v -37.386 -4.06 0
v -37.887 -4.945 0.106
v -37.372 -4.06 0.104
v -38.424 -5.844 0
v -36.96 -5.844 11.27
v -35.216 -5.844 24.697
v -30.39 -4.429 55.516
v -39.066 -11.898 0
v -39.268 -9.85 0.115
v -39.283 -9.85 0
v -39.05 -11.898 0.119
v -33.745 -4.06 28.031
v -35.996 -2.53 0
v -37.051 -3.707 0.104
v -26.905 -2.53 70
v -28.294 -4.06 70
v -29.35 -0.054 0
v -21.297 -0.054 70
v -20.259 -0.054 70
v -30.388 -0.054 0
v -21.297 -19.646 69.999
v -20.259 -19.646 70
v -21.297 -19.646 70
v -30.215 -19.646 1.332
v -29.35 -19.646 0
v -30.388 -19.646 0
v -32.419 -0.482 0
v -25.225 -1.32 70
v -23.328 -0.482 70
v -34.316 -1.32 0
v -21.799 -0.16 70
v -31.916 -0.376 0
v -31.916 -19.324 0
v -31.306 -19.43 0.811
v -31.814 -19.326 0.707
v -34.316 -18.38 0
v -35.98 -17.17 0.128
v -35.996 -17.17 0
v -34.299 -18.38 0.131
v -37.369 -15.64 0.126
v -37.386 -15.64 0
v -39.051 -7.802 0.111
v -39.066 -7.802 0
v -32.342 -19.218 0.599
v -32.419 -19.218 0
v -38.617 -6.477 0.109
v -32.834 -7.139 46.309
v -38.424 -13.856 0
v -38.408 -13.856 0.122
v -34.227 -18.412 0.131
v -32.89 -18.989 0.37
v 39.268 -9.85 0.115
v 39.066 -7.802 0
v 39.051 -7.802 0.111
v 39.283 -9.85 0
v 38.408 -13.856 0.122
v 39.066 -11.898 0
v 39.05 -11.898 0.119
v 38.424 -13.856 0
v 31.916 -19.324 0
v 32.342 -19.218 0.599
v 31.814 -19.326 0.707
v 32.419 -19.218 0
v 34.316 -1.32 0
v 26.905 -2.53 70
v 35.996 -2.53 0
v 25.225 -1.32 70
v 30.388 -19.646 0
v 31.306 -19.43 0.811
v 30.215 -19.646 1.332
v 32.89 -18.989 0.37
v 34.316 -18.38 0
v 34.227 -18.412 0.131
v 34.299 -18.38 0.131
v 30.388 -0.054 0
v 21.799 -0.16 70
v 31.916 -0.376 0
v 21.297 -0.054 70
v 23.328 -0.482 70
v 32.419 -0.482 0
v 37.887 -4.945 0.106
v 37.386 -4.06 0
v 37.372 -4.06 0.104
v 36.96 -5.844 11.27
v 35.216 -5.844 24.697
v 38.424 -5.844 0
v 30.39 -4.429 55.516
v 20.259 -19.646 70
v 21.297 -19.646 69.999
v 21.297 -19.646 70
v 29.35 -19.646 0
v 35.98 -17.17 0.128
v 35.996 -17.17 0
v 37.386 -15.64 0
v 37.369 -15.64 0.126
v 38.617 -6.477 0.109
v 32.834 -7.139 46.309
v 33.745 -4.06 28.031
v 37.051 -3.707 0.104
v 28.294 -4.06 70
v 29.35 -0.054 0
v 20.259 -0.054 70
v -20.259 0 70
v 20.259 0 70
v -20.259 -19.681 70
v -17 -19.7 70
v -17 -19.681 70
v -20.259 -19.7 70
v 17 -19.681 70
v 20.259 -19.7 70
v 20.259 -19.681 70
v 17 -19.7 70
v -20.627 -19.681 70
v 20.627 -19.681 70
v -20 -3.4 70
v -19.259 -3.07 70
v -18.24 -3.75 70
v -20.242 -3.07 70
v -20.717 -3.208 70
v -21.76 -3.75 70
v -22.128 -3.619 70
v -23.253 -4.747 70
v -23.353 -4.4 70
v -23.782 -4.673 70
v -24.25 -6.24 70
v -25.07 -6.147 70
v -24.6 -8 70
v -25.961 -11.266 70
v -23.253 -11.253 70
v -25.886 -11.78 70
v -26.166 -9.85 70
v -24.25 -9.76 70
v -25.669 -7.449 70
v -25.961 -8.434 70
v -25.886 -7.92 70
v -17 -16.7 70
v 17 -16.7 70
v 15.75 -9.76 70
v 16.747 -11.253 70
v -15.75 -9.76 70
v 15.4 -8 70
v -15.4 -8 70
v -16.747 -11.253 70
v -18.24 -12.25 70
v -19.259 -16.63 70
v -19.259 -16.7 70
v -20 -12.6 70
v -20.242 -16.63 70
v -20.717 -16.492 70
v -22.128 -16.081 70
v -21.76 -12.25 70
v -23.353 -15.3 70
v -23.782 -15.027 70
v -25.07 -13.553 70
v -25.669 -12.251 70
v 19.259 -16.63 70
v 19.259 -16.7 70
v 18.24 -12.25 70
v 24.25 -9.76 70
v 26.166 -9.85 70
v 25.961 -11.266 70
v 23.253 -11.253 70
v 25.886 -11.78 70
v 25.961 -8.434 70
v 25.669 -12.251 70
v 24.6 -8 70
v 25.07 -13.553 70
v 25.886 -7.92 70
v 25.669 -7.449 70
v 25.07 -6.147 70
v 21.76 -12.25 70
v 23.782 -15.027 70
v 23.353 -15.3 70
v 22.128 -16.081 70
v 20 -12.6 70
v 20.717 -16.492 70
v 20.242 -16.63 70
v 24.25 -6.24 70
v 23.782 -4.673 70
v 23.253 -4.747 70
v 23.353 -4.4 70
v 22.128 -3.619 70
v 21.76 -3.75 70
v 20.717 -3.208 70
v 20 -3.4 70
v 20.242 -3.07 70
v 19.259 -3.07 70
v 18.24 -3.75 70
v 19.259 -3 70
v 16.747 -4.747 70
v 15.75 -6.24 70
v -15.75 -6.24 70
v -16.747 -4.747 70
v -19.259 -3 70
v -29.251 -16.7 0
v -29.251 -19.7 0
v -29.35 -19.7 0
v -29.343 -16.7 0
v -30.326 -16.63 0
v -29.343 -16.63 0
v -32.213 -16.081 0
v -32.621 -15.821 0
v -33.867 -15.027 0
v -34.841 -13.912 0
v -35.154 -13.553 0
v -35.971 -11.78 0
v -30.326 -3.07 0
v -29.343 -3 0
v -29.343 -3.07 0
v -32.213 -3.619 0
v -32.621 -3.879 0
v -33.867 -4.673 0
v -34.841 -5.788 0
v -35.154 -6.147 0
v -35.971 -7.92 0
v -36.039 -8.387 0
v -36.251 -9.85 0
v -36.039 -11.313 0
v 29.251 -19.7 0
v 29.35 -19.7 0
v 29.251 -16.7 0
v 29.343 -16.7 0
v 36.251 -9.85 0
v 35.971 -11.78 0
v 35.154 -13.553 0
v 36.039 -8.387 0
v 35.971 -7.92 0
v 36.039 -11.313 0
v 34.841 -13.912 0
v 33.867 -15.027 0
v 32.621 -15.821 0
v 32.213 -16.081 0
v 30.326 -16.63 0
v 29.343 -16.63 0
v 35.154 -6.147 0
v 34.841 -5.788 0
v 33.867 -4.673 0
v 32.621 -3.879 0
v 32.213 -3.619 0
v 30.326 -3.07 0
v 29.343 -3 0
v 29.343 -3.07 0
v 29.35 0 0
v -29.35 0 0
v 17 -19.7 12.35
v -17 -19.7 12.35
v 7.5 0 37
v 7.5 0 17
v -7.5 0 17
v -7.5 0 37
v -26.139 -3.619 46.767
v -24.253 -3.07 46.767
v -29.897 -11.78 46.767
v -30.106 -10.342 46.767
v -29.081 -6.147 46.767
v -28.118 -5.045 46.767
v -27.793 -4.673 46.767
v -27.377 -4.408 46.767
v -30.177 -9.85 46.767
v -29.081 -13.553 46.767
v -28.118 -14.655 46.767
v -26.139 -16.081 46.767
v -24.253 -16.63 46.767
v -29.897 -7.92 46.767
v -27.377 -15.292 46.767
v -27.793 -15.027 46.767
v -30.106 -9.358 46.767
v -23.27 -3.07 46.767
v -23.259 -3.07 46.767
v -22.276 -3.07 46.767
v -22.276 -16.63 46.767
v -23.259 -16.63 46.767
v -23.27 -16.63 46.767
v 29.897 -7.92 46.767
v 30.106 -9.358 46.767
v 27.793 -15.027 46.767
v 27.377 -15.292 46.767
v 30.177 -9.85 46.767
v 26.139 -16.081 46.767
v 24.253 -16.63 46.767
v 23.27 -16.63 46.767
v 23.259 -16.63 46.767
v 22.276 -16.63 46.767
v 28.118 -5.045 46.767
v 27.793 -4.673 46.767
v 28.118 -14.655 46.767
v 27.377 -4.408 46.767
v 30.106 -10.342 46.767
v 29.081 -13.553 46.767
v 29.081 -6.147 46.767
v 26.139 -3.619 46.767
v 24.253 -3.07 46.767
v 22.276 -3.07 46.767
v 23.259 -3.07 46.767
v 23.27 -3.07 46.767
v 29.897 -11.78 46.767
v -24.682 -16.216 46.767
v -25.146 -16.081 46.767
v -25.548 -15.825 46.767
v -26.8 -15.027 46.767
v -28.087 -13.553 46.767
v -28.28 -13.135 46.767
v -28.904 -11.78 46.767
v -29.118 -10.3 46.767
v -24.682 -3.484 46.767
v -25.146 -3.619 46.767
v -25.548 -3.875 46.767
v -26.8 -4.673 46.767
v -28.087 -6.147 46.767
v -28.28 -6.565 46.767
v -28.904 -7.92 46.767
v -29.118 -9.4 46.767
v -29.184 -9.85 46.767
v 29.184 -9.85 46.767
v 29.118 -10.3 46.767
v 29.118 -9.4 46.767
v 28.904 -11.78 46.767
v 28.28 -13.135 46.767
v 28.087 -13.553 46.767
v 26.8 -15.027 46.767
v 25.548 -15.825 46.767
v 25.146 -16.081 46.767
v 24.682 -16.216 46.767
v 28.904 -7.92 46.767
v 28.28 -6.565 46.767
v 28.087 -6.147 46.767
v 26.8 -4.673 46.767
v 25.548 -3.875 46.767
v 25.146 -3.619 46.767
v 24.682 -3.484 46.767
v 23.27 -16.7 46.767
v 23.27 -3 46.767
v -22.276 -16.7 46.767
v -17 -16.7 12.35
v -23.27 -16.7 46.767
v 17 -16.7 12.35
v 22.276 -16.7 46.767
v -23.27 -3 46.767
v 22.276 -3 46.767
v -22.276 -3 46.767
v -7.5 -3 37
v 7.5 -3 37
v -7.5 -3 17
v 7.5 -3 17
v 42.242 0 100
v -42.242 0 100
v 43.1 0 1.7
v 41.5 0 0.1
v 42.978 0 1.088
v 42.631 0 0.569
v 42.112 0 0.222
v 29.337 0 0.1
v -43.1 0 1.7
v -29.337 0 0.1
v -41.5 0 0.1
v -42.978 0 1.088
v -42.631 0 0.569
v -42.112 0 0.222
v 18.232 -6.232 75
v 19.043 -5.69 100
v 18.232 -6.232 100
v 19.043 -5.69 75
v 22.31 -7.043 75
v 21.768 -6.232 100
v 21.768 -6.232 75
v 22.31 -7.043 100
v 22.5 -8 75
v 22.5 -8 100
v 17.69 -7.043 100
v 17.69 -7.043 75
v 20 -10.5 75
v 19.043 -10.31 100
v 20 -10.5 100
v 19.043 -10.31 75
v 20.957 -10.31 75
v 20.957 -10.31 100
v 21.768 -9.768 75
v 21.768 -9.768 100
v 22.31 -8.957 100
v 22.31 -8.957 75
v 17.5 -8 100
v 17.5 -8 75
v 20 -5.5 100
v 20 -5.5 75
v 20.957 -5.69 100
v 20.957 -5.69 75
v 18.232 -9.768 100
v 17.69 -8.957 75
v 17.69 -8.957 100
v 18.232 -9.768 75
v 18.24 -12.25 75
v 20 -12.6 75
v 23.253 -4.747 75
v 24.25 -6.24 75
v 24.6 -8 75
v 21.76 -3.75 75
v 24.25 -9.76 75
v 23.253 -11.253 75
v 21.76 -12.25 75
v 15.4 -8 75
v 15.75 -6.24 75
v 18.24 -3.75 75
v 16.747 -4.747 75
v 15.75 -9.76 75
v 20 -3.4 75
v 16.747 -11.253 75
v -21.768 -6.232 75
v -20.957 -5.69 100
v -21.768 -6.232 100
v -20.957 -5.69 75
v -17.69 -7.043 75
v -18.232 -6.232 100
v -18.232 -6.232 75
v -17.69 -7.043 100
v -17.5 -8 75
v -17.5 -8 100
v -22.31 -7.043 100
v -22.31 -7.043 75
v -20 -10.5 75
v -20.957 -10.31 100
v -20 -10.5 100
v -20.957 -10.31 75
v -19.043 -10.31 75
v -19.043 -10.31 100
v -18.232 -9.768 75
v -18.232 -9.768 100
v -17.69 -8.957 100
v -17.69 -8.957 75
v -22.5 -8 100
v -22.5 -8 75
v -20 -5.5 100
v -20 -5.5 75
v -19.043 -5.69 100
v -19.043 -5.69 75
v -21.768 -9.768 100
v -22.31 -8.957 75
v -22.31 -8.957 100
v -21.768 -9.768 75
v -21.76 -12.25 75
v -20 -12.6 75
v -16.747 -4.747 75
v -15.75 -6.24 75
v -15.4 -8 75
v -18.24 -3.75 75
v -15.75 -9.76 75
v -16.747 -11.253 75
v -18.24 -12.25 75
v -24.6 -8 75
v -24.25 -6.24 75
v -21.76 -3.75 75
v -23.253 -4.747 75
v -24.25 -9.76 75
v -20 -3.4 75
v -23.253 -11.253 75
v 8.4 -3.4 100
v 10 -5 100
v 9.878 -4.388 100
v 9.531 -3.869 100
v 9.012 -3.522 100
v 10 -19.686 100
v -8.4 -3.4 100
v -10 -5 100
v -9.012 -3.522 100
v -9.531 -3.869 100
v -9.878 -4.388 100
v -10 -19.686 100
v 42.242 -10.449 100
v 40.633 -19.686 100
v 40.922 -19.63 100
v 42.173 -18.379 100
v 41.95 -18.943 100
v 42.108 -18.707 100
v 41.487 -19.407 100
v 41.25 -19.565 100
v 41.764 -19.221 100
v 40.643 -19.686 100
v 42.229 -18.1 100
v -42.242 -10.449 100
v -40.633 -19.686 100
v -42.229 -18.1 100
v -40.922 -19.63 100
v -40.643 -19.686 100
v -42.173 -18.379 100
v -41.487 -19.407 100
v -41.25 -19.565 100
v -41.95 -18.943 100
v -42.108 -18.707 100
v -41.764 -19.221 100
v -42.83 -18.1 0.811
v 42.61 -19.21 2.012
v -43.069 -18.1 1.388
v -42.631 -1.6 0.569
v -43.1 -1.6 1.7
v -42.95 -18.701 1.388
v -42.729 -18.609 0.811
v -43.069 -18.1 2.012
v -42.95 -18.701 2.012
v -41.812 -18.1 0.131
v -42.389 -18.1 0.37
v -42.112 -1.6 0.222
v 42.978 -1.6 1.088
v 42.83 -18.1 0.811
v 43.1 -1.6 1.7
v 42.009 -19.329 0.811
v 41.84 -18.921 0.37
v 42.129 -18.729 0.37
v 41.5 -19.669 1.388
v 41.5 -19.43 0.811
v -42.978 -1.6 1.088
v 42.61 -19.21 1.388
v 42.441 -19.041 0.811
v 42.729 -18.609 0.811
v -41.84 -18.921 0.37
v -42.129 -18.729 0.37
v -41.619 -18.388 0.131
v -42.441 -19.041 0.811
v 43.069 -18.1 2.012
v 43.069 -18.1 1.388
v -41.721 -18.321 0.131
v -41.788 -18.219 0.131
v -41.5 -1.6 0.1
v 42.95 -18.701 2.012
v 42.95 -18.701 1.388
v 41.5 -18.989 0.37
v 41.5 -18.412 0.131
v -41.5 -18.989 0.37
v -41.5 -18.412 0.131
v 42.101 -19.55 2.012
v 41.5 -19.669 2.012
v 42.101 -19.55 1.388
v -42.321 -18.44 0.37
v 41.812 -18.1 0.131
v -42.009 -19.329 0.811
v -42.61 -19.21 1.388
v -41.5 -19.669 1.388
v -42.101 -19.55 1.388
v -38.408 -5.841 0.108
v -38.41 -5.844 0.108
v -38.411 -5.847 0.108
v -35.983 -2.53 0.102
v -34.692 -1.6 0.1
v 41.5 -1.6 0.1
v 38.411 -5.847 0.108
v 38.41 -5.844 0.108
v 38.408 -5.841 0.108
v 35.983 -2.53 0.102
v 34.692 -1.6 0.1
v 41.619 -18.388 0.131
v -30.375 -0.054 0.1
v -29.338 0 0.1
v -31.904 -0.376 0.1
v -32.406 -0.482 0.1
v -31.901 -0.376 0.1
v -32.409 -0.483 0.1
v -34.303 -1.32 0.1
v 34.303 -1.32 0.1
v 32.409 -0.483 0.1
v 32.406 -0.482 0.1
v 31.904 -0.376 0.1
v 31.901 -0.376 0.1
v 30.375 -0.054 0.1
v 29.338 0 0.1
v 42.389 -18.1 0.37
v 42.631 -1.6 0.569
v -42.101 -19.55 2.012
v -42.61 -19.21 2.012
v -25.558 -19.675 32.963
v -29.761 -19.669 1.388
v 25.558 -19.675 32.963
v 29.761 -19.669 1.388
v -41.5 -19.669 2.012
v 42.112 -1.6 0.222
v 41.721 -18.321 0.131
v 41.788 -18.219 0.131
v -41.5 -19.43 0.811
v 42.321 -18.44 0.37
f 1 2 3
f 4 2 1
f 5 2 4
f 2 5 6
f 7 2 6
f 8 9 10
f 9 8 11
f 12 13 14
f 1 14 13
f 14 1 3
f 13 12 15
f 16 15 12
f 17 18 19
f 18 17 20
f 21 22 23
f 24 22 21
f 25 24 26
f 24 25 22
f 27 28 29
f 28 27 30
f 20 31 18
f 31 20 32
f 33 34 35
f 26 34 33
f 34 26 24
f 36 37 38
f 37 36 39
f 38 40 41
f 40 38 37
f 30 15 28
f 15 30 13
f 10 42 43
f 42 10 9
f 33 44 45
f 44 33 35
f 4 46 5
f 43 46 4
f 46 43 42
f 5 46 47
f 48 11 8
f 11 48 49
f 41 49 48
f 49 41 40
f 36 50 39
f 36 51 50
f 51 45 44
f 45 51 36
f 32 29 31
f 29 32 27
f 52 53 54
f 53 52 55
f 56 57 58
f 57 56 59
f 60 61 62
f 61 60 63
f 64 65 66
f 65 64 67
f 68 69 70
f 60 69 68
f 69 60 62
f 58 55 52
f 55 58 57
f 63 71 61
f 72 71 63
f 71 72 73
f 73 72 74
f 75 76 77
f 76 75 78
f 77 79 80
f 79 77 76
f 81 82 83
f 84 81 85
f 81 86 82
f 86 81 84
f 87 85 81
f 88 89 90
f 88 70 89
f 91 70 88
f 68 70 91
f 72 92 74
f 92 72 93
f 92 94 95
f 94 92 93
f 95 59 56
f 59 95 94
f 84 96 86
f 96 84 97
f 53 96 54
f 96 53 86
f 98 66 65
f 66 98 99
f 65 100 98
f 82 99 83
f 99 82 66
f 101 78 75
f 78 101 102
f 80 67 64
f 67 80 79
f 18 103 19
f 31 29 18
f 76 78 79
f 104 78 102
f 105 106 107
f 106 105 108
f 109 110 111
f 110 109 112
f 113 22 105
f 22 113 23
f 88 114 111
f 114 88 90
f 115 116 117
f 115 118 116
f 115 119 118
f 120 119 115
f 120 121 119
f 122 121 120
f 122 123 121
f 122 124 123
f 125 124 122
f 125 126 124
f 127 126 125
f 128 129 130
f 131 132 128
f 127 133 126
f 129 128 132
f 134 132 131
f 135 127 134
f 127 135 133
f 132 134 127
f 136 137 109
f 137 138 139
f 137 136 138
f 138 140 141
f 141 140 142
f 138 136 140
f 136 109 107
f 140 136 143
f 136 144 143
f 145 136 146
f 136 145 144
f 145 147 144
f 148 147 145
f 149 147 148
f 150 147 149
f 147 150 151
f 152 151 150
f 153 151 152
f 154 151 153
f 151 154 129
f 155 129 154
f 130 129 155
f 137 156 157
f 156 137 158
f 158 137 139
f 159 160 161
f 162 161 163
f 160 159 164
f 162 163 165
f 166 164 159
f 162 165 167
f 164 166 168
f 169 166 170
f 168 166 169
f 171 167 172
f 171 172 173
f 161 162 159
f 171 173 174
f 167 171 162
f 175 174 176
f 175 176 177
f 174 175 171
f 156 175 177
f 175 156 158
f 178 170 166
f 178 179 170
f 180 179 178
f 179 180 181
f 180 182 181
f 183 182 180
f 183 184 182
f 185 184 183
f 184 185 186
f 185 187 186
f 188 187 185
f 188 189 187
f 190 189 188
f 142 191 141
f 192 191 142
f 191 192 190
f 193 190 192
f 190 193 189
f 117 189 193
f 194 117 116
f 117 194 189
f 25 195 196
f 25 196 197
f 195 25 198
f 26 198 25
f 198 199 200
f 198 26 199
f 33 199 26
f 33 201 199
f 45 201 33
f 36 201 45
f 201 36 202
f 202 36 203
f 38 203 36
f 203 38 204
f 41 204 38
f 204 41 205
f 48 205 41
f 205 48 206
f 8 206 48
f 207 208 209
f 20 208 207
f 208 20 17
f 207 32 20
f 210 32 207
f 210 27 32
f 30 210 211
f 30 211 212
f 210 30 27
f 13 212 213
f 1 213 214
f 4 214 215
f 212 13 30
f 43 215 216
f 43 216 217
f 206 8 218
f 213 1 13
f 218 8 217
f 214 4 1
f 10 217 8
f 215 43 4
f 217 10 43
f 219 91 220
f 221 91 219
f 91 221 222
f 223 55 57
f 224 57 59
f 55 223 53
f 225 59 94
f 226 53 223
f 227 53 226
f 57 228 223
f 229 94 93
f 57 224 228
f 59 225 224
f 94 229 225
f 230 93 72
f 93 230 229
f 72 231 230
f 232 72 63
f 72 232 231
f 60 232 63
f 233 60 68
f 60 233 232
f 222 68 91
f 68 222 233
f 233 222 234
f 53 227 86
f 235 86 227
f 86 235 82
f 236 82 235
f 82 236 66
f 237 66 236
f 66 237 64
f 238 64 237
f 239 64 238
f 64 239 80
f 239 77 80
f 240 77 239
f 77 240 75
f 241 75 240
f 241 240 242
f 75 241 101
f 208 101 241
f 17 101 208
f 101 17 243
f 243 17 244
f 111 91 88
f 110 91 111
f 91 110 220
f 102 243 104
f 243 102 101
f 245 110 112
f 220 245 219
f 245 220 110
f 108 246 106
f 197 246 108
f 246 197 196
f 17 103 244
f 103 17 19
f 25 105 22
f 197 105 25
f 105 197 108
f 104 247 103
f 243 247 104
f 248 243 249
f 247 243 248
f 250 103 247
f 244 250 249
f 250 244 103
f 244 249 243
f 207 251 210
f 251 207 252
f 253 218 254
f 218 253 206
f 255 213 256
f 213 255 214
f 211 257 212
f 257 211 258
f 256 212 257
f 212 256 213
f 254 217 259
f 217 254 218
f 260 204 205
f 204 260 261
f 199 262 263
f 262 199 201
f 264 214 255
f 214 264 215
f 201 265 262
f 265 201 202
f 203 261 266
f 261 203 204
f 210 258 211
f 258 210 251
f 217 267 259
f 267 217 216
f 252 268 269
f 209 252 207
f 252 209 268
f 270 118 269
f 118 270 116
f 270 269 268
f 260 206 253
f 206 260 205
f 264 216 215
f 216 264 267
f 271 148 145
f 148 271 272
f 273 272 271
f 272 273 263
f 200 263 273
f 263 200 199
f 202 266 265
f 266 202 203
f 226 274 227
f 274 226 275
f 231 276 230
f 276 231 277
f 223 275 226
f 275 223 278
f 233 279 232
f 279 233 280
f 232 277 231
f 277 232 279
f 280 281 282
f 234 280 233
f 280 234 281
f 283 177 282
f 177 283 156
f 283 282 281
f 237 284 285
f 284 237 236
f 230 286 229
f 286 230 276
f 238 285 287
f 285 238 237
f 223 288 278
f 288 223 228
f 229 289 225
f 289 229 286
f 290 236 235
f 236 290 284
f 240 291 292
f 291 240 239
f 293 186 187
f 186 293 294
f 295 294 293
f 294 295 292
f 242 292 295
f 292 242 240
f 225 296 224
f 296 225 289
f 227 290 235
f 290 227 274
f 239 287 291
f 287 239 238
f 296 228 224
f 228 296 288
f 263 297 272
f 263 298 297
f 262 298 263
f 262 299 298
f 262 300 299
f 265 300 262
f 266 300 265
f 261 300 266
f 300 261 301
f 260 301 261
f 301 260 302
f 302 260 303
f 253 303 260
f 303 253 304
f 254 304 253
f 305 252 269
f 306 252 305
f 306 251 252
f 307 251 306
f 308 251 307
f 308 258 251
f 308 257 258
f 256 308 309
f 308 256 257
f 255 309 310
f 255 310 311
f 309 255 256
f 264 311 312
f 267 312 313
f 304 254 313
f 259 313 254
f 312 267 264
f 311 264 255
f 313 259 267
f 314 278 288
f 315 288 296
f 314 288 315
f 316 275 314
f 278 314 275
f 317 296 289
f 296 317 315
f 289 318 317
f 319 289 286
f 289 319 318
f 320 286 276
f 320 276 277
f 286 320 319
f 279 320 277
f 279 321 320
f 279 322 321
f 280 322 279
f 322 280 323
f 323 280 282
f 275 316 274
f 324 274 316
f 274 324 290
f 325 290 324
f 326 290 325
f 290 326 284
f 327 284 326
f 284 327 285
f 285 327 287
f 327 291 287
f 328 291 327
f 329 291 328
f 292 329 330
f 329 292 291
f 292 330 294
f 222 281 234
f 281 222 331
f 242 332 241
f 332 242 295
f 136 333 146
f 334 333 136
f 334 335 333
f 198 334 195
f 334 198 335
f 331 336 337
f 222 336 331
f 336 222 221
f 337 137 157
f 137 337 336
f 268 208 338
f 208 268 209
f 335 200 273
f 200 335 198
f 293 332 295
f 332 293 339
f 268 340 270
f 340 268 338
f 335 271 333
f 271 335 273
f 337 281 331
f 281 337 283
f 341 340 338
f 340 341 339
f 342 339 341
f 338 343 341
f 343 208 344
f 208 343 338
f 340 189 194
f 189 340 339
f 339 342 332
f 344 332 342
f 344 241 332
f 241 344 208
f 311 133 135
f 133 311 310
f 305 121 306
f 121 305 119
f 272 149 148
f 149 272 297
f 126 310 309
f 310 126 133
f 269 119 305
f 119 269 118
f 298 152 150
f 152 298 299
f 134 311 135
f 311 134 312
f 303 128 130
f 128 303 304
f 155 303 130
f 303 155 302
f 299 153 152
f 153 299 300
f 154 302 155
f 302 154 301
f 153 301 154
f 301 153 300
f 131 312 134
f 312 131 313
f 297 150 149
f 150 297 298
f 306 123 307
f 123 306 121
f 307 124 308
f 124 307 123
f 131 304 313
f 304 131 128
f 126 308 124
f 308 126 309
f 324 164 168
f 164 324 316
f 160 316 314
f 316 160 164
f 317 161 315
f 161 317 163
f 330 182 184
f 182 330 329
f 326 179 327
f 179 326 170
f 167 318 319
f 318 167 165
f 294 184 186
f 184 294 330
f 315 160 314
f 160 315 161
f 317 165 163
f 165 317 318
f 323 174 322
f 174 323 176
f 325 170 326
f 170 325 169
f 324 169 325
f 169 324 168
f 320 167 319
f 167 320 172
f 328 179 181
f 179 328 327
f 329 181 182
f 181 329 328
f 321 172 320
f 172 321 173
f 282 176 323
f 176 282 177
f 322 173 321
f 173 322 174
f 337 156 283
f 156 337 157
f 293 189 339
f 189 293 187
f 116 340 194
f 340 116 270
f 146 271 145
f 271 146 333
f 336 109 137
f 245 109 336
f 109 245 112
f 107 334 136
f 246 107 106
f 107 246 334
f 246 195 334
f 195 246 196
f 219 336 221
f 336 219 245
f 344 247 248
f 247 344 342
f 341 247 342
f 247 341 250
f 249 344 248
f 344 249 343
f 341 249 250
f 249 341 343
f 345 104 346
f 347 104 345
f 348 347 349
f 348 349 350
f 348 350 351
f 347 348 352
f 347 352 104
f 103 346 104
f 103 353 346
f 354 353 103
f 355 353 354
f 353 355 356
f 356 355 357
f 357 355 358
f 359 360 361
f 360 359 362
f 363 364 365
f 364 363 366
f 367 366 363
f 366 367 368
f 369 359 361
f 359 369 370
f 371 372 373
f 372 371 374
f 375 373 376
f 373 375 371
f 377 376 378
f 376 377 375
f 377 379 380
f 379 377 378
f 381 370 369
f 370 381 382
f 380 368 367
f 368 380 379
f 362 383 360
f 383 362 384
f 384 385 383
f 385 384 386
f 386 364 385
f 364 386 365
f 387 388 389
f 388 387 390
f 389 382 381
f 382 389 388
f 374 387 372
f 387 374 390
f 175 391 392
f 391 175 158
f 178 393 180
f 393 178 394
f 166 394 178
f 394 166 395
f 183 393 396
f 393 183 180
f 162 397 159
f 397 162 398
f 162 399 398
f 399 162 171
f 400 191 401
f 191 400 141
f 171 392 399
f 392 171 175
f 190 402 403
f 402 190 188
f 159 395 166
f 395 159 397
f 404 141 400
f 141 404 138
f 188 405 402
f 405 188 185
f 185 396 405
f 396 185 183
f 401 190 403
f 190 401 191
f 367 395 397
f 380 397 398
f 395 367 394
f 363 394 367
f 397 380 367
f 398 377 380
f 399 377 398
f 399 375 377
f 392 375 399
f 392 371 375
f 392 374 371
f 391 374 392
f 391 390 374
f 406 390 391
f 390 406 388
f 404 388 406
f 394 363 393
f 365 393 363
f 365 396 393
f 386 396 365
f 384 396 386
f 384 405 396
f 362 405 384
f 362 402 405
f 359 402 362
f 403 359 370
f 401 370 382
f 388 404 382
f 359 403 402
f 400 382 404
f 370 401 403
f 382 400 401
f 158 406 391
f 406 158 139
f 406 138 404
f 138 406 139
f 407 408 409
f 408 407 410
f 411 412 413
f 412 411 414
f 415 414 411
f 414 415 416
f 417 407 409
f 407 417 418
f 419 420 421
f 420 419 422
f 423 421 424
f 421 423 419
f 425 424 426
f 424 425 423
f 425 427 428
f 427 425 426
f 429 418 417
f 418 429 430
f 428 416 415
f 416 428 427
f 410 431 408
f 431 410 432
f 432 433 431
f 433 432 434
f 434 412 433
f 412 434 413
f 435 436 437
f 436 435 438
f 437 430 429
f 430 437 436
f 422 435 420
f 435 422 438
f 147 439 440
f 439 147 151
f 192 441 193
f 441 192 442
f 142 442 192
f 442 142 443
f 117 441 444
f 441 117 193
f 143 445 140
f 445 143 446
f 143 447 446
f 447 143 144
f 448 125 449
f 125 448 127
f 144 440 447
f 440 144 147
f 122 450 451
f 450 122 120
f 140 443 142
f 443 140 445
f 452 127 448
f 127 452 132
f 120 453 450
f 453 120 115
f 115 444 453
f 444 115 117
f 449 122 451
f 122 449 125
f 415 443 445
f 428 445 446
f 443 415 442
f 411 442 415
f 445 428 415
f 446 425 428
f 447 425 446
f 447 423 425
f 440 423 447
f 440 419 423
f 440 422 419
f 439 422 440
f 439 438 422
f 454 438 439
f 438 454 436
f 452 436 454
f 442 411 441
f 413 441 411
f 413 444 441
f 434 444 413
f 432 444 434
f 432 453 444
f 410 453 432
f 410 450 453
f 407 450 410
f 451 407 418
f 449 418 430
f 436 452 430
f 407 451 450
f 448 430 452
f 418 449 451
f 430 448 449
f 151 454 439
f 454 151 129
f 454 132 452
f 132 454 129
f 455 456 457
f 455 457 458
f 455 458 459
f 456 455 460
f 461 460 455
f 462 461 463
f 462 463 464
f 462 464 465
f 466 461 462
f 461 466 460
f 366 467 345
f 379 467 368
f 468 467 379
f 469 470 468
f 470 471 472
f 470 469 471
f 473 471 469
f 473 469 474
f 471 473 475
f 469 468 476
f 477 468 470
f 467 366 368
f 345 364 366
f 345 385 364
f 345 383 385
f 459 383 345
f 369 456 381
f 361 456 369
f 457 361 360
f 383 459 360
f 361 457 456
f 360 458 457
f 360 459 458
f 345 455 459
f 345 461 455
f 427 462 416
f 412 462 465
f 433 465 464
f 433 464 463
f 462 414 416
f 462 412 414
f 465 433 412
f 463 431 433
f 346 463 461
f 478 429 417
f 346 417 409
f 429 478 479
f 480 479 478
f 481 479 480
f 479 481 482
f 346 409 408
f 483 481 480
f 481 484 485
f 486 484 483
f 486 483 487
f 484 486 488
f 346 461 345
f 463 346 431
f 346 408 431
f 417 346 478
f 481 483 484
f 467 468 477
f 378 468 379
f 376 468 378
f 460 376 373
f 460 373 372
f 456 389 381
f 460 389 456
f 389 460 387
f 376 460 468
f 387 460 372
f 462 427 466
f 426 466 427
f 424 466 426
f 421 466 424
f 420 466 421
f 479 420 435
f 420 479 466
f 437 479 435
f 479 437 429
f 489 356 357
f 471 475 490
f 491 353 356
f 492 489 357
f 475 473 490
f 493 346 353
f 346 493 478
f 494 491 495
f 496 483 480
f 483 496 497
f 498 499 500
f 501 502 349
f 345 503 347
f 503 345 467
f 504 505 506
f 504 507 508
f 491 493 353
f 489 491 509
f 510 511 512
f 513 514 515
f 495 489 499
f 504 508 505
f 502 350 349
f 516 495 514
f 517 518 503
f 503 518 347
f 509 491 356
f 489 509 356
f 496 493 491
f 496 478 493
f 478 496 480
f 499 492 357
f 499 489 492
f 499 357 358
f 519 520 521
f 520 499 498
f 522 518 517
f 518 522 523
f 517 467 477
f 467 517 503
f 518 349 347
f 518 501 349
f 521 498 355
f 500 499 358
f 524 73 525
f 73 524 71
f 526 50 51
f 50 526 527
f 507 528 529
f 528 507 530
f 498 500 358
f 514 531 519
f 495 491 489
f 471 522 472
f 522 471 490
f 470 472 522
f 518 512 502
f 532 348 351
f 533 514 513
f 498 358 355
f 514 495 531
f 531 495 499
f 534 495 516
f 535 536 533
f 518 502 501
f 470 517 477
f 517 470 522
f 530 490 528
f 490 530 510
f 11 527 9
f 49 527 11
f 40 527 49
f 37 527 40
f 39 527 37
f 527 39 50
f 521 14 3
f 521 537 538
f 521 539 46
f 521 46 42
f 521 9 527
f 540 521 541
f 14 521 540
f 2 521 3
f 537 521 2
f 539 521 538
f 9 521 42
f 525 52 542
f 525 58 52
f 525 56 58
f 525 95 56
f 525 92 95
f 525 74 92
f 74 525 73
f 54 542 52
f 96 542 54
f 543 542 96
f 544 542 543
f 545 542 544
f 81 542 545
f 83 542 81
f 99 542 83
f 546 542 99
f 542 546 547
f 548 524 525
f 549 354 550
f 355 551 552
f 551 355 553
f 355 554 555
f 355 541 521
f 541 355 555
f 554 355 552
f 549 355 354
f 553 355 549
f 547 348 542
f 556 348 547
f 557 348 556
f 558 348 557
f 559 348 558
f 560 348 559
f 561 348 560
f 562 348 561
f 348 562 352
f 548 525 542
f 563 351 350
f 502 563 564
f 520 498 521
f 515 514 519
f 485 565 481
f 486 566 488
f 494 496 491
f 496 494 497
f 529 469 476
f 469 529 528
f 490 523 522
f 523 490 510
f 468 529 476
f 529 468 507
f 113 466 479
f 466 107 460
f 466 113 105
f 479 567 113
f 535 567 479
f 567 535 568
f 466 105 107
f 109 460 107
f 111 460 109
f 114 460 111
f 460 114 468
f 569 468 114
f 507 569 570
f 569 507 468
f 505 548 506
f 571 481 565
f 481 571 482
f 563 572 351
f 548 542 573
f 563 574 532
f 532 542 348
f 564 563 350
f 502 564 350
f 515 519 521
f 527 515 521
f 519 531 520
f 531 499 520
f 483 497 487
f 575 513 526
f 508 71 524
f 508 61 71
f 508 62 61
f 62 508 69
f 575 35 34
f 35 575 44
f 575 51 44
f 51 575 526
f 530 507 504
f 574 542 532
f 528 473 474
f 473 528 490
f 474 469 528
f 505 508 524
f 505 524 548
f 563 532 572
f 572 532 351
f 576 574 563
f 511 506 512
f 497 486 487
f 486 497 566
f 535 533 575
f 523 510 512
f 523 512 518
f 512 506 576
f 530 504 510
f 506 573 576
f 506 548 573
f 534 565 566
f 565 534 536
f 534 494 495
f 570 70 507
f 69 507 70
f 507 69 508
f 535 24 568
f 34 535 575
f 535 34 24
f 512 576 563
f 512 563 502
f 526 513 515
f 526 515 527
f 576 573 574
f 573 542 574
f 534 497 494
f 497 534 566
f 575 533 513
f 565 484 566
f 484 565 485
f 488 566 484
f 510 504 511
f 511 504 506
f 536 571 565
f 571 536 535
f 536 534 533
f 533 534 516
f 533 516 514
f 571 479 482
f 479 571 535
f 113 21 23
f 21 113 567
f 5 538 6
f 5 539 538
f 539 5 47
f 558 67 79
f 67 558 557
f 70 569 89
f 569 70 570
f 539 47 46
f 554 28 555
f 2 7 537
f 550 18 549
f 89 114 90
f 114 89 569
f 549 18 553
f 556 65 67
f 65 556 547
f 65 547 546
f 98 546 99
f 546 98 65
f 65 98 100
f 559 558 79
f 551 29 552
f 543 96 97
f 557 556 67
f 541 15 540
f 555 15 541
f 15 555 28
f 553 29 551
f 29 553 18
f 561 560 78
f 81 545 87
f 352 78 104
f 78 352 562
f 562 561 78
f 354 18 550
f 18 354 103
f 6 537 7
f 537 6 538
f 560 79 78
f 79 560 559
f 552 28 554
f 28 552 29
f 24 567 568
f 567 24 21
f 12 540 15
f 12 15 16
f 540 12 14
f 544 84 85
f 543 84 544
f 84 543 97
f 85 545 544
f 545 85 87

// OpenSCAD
// file: brompton-klickfix.scad
use <MCAD/regular_shapes.scad>

//Bodge amount for overlapping parts in difference operations
b = 0.1;

//Klickfix lift
kl = 150;


//Main body dimensions
w = 83;
d = 19.7;
h = kl+35;

//Split height
spl = 100;

//Brompton socket height
bsh = 70;
	
//Stiffeners
sd = 5;

//Corner radius
r = 1.6;

module fillet (r,l) {
	rotate([0,0,180])
		translate([-r,-r,0])
			difference() {
				cube([r,r,l]);
				translate([0,0,-l/2])
					cylinder(2*l,r,r,$fn=16);
    }
}

module spool(sd,sl) {
	t = 0.1;
	cylinder(sl,sd/2,sd/2,$fn=16);
	cylinder(sd,sd*1.8/2+t,sd*1.8/2+t,$fn=16);
	translate([0,0,sl-sd])
		cylinder(sd,sd*1.8/2+t,sd*1.8/2+t,$fn=6);
}

//Cube with 8 rounded edges and 4 square edges
module semi_rounded_cube(w,d,h,r) {
    hull()
        for(i=[0,1])
            for(j=[0,1])
                translate([r+i*(w-2*r),r+j*(d-2*r),0]){
                    cylinder(r,r,r,$fn=16);
                    translate([0,0,h-r])
                        sphere(r,$fn=16);
                }
}

//Cube with 5 rounded edges and 7 square edges
module demi_rounded_cube(w,d,h,r) {
    hull()
        for(i=[0,1])
            translate([r+i*(w-2*r),0,0]){
                translate([0,r,0])
                    cylinder(r,r,r,$fn=16);
                translate([-r,d-2*r,0])
                    cube([2*r,2*r,2*r]);
                translate([0,r,h-r])
                    sphere(r,$fn=16);
                translate([0,d-r,h-r])
                    rotate([-90,0,0])
                        cylinder(r,r,r,$fn=16);
            }

}


//Extruded trapezium with rounded sides
//h=height
//w=width of base between centres of rounded sides
//a=angle of sides from vertical
//r=radius of rounded sides (thickness = 2*r)
module rd_tpz(h,w,a,r) {
    union() {
        intersection() {
			//Create two cylinders for the rounded sides
            union() {
                translate([-w/2,0,0])
                    rotate([0,a,0])
                        translate([0,0,-h/2])
                            cylinder(2*h,r,r);               
                translate([w/2,0,0])
                    rotate([0,-a,0])
                        translate([0,0,-h/2])
                            cylinder(2*h,r,r);
            }
			//Intersect with cube to get desired height
            {
                translate([0,0,h/2])
                    cube([2*w,r*4,h],true);
            }
       }

	//Fill in between cylinders with an extruded trapezium
    w_t=w-2*h*tan(a);
    translate([0,r,0])
        rotate([90,0,0])
            linear_extrude(height=2*r,convexity=10)
                polygon([[-w/2,0],[-w_t/2,h],[w_t/2,h],[w/2,0]]);
    }
}

//Round fillet for front of brompton socket
//r = radius of fillet
//a = tilt angle
//h = height of fillet
module b_fill (r,a,h) {
    intersection(){
        rotate([0,a,0]){
			//Create fillet by subtracting two cylinders from a cube
            difference(){
                translate([-r,0,-h/2])
                   cube([2*r,r,2*h]);
                translate([-r,0,-h/2])
                    cylinder(2*h,r,r);
                translate([r,0,-h/2])
                    cylinder(2*h,r-b,r-b);
            }
        }
		//Intersect with cube to get desired height
		translate([0,0,h/2])
			cube([2*h,r*4,h],true);
    }
}

//Brompton socket
module b_socket () {
	//Parameters
	r = 13.7/2;	//Radius of groove
	h = bsh;		//Height of socket
	c = 2.45;		//Clearance around mounting block
	w = 67.5+2*c-2*r;	//Width of socket between groove centres
	a = 7.4;		//Tilt angle of grooves from vertical
	t = 3;		//Thickness of socket shell
	s = 1;		//Size of step in groove
	sp = 2/3;	//Position of step relative to socket height
	ow = 34;		//Width of cut-out in back of socket
	tc = [15,t+b,20];	//Size of latch hole
	th = 27;		//Height of latch hole centre
	translate([0,-r-t,0])
		difference() {
			//External shape of socket
			rd_tpz(h,w,a,r+t);
			//Remove Lower part of inner
			translate([0,0,-b])
				rd_tpz(h*sp+b*2,w+b*sin(a),a,r);
			//Remove Upper part of inner
			translate([0,0,h*sp])
				rd_tpz(h*(1-sp)+b,w-2*h*sp*tan(a)-2*s ,a,r);
			//Remove Rear cut-out
			translate([0,-r+b/2,0])
				rotate([90,0,0])
					linear_extrude(height=t+b,convexity=10)
						polygon([[-w/2,-b],[-ow/2,(w-ow)/2],[-ow/2,h+b],[ow/2,h+b],[ow/2,(w-ow)/2],[w/2,-b]]);
			//Remove Latch hole
			translate([0,r+t/2,th])
				cube(tc,center=true);
		}

	//Add fillets at front of socket
	/*translate([-w/2-r-t,-r-t,0])
		b_fill(r+t,a,h);
	mirror([1,0,0])
		translate([-w/2-r-t,-r-t,0])
			b_fill(r+t,a,h);*/
}

module kfix_plug () {
	//Parameters
	h = 35;		//Height of plug
	d = 12.5;	//Depth of plug
	sw = 35;	//Width of square
	sr = 1.6;	//Radius of square corners
	hc = 68;	//Hook spacing
	hw = 15;	//Hook width
	hl = 6;		//Hook length
	ht = 3.5;	//Hook thickness
	
	//Square plug
	hull()
		for(i=[0,1])
			for(j=[0,1]) {
				translate([-sw/2+sr+i*(sw-2*sr),sr,sr+j*(h-2*sr)])
					sphere(sr,$fn=16);
				translate([-sw/2+sr+i*(sw-2*sr),d,sr+j*(h-2*sr)])
					rotate([90,0,0])
						cylinder(d/2,sr,sr,$fn=16);
			}
	//Hooks
	for(i=[0,1]) {
		c = -hc/2+i*hc; //Centre of this hook
		translate([c-hw/2,0,0]){
			cube([hw,d,h]);
			translate([0,0,h])
				hull(){
					translate([sr,0,hl-sr])
						rotate([-90,0,0])
							cylinder(ht,sr,sr,$fn=16);
					translate([hw-sr,0,hl-sr])
						rotate([-90,0,0])
							cylinder(ht,sr,sr,$fn=16);
					cube([hw,ht,hl/2]);}
			translate([0,ht,h])
				rotate([0,90,0])
					rotate([0,0,90])
						fillet(sr,hw);
		}
	}
	

}

module kf_tab_cutout(){
    
    //KF tab cutout
    kft_w = 20;
    kft_h = 10;
    kft_f = 7; //finger radius   
    kfh_r = 3; //radius of hook channel
	kft_hd = 5+kfh_r; //Depth of hook channel from front
    kft_d = d-kft_hd+kfh_r+r; //Overall depth of tab cutout

    translate([-kft_w/2,kft_d,0])
        mirror([0,1,0]) {
			demi_rounded_cube(kft_w,kft_d,kft_h,r);
			translate([kft_w/2,kft_d,kft_h])
				sphere(kft_f,$fn=32);
			translate([kft_w/2,kfh_r+r,kft_h-r])
				cylinder(h-spl-kft_h,kfh_r,kfh_r,$fn=16);
	}

}

module body(){

	//KF latch cutout
	kfl_w = 53;
	kfl_h = 10;
	kfl_d = 12.5;
    
	
	//fixing hole 
	hd = 5; //diameter
	hs = 40; // hole spacing
	hy = 8;//9.85; // hole distance from front
	
	difference(){
		union()
            //Outer cube of block
			hull()
			{
				translate([-w/2,-d+r,r+b])
					sphere(r,$fn=16);
				translate([w/2,-d+r,r+b])
					sphere(r,$fn=16);
				translate([-w/2,0,r+b])
					rotate([90,0,0])
						cylinder(r,r,r,$fn=16);
				translate([w/2,0,r+b])
					rotate([90,0,0])
						cylinder(r,r,r,$fn=16);
				translate([w/2-r,-r,h-r])
					cube([r,r,r]);
				translate([-w/2,-r,h-r])
					cube([r,r,r]);
				translate([-w/2+r,-d+r,h-r])
					cylinder(r,r,r,$fn=16);
				translate([w/2-r,-d+r,h-r])
					cylinder(r,r,r,$fn=16);
				}
		//Minus hull of brompton socket
        hull()
			b_socket();
        //Minus hull of klickfix plug
		hull()
			translate([0,0,kl])
				rotate([0,0,180])
					kfix_plug();
		
        //Minus gap below klickfix 
		translate([-kfl_w/2,-kfl_d,kl-kfl_h])
			cube([kfl_w,kfl_d,kfl_h+b]);
                
        //Minus 2x fastening holes
		translate([hs/2,-hy,bsh])
			spool(hd,kl-kfl_h-bsh);
		translate([-hs/2,-hy,bsh])
			spool(hd,kl-kfl_h-bsh);
            
        //Minus latch tab hole
        translate([0,-d,spl])
			kf_tab_cutout();
	}
}

module brompton_klickfix(){
		body();		
		b_socket();
		translate([0,0,kl])
			rotate([0,0,180])
				kfix_plug();
}
// main file
use <brompton-klickfix.scad>

intersection(){
	brompton_klickfix();
	translate([-500,-500,0])
		cube([1000,1000,100]);
}
